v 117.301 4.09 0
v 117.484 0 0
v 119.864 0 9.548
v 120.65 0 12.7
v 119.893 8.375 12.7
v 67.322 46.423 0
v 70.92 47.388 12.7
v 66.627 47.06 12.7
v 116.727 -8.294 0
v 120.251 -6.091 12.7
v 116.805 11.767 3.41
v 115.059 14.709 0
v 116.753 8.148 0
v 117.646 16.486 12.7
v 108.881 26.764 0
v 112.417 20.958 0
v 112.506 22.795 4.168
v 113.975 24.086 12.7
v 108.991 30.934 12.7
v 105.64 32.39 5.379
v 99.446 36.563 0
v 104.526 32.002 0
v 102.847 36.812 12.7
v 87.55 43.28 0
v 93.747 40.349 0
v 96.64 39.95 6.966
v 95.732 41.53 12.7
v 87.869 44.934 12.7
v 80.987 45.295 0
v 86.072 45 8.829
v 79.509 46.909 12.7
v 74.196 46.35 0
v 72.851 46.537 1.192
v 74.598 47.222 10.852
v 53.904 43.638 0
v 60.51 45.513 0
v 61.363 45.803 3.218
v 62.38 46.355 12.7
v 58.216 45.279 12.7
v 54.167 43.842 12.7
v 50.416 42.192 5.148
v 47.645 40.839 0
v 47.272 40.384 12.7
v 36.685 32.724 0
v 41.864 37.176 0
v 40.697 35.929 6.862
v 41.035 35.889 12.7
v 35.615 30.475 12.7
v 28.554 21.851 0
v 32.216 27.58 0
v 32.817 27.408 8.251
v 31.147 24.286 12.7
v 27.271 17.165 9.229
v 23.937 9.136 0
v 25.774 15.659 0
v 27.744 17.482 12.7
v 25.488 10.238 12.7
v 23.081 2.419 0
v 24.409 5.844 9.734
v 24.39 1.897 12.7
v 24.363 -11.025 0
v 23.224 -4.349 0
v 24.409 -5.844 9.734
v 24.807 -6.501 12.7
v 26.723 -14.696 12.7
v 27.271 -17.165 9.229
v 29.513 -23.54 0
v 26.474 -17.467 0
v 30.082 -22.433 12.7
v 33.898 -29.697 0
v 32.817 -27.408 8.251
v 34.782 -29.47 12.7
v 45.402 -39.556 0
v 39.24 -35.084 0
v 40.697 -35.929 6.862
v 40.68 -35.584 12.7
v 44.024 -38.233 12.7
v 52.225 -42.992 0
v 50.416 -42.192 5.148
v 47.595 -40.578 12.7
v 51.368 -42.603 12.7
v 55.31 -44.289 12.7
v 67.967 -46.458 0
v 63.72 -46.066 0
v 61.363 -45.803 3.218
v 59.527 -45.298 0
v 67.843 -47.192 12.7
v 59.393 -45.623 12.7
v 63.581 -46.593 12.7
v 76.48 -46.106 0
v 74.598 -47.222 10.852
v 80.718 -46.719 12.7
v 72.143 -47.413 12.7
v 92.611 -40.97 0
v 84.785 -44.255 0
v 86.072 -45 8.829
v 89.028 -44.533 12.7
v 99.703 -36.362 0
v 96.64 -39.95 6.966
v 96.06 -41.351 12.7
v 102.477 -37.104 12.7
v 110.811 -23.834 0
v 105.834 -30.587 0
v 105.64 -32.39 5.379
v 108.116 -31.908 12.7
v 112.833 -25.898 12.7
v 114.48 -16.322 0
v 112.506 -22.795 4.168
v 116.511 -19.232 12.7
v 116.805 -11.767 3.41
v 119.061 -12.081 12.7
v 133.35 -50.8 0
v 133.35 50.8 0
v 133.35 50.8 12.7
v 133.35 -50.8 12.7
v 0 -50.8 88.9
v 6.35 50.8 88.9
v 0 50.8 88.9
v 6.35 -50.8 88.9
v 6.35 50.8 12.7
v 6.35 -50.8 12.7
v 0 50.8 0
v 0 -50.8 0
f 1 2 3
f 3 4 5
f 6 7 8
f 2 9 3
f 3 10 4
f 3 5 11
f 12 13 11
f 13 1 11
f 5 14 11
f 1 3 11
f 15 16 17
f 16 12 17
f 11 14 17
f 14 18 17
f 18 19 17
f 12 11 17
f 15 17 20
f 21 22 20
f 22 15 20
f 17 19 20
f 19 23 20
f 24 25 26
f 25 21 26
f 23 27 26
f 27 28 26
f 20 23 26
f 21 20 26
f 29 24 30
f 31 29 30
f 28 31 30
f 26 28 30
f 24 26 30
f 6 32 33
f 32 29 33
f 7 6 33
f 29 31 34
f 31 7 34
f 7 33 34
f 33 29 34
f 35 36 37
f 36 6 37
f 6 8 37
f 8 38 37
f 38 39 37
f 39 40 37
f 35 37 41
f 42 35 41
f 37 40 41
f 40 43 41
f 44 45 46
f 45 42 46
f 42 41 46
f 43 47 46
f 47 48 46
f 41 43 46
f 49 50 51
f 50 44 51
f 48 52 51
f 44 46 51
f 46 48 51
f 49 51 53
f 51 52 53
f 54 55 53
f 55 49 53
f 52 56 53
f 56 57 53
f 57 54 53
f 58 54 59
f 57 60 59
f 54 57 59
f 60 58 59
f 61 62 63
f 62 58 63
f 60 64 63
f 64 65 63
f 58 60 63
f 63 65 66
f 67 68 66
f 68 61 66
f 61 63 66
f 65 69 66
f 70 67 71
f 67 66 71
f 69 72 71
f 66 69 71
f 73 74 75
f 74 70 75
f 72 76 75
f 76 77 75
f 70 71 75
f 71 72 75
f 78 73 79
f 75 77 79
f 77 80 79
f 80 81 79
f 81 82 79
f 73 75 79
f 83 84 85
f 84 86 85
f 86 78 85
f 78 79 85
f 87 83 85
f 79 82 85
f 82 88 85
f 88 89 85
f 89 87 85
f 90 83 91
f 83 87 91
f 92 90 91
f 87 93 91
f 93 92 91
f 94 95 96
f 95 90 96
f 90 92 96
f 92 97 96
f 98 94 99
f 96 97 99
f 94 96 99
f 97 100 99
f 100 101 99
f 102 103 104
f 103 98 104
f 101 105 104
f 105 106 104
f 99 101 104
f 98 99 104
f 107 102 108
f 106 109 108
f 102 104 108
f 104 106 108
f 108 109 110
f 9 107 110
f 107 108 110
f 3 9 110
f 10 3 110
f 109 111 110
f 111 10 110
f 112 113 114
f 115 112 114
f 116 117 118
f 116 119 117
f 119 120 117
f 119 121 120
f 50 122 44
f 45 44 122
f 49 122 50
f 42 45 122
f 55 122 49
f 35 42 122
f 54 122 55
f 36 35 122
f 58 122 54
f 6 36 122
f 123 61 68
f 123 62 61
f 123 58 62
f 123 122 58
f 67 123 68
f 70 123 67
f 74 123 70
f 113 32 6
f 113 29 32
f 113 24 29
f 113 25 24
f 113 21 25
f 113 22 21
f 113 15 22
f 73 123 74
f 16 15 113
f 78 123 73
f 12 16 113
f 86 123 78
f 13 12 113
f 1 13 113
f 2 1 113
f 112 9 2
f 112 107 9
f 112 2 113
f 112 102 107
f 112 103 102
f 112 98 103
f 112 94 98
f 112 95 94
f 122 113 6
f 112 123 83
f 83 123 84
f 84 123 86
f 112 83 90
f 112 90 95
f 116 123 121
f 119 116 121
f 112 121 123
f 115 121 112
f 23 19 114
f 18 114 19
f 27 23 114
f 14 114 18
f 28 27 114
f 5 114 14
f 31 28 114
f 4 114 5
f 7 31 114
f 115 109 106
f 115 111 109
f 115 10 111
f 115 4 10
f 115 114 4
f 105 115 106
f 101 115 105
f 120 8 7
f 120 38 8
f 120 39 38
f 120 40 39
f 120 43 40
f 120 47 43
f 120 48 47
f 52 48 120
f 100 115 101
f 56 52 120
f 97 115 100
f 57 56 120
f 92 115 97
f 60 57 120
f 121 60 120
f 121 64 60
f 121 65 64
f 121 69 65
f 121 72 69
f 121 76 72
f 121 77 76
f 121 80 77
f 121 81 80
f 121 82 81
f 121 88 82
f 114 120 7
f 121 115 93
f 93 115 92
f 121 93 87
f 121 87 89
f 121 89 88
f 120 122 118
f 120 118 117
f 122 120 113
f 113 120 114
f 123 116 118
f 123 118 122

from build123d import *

# Parameters (mm, degrees)
F1_DEPTH = 50.8


with BuildPart() as f1:
    # F0 (on Front) → F1 (new body, symmetric)
    with BuildSketch(Plane.XZ):
        Polygon((6.35, 88.9), (0, 88.9), (0, 0), (133.35, 0), (133.35, 12.7), (6.35, 12.7), align=None)
    extrude(amount=F1_DEPTH, both=True)

    # F2 (on Front) → F3 (revolve, cut)
    with BuildSketch(Plane.XZ):
        Polygon((73.3769804781, 21.0355088013), (64.5556530526, -28.9927250518), (108.330357674, -36.711386549), (120.65, 12.7), align=None)
    revolve(axis=Axis((68.9663167654, 0, -3.9786081252), (0.1736481777, 0, 0.984807753)), mode=Mode.SUBTRACT)


solid = f1.part
